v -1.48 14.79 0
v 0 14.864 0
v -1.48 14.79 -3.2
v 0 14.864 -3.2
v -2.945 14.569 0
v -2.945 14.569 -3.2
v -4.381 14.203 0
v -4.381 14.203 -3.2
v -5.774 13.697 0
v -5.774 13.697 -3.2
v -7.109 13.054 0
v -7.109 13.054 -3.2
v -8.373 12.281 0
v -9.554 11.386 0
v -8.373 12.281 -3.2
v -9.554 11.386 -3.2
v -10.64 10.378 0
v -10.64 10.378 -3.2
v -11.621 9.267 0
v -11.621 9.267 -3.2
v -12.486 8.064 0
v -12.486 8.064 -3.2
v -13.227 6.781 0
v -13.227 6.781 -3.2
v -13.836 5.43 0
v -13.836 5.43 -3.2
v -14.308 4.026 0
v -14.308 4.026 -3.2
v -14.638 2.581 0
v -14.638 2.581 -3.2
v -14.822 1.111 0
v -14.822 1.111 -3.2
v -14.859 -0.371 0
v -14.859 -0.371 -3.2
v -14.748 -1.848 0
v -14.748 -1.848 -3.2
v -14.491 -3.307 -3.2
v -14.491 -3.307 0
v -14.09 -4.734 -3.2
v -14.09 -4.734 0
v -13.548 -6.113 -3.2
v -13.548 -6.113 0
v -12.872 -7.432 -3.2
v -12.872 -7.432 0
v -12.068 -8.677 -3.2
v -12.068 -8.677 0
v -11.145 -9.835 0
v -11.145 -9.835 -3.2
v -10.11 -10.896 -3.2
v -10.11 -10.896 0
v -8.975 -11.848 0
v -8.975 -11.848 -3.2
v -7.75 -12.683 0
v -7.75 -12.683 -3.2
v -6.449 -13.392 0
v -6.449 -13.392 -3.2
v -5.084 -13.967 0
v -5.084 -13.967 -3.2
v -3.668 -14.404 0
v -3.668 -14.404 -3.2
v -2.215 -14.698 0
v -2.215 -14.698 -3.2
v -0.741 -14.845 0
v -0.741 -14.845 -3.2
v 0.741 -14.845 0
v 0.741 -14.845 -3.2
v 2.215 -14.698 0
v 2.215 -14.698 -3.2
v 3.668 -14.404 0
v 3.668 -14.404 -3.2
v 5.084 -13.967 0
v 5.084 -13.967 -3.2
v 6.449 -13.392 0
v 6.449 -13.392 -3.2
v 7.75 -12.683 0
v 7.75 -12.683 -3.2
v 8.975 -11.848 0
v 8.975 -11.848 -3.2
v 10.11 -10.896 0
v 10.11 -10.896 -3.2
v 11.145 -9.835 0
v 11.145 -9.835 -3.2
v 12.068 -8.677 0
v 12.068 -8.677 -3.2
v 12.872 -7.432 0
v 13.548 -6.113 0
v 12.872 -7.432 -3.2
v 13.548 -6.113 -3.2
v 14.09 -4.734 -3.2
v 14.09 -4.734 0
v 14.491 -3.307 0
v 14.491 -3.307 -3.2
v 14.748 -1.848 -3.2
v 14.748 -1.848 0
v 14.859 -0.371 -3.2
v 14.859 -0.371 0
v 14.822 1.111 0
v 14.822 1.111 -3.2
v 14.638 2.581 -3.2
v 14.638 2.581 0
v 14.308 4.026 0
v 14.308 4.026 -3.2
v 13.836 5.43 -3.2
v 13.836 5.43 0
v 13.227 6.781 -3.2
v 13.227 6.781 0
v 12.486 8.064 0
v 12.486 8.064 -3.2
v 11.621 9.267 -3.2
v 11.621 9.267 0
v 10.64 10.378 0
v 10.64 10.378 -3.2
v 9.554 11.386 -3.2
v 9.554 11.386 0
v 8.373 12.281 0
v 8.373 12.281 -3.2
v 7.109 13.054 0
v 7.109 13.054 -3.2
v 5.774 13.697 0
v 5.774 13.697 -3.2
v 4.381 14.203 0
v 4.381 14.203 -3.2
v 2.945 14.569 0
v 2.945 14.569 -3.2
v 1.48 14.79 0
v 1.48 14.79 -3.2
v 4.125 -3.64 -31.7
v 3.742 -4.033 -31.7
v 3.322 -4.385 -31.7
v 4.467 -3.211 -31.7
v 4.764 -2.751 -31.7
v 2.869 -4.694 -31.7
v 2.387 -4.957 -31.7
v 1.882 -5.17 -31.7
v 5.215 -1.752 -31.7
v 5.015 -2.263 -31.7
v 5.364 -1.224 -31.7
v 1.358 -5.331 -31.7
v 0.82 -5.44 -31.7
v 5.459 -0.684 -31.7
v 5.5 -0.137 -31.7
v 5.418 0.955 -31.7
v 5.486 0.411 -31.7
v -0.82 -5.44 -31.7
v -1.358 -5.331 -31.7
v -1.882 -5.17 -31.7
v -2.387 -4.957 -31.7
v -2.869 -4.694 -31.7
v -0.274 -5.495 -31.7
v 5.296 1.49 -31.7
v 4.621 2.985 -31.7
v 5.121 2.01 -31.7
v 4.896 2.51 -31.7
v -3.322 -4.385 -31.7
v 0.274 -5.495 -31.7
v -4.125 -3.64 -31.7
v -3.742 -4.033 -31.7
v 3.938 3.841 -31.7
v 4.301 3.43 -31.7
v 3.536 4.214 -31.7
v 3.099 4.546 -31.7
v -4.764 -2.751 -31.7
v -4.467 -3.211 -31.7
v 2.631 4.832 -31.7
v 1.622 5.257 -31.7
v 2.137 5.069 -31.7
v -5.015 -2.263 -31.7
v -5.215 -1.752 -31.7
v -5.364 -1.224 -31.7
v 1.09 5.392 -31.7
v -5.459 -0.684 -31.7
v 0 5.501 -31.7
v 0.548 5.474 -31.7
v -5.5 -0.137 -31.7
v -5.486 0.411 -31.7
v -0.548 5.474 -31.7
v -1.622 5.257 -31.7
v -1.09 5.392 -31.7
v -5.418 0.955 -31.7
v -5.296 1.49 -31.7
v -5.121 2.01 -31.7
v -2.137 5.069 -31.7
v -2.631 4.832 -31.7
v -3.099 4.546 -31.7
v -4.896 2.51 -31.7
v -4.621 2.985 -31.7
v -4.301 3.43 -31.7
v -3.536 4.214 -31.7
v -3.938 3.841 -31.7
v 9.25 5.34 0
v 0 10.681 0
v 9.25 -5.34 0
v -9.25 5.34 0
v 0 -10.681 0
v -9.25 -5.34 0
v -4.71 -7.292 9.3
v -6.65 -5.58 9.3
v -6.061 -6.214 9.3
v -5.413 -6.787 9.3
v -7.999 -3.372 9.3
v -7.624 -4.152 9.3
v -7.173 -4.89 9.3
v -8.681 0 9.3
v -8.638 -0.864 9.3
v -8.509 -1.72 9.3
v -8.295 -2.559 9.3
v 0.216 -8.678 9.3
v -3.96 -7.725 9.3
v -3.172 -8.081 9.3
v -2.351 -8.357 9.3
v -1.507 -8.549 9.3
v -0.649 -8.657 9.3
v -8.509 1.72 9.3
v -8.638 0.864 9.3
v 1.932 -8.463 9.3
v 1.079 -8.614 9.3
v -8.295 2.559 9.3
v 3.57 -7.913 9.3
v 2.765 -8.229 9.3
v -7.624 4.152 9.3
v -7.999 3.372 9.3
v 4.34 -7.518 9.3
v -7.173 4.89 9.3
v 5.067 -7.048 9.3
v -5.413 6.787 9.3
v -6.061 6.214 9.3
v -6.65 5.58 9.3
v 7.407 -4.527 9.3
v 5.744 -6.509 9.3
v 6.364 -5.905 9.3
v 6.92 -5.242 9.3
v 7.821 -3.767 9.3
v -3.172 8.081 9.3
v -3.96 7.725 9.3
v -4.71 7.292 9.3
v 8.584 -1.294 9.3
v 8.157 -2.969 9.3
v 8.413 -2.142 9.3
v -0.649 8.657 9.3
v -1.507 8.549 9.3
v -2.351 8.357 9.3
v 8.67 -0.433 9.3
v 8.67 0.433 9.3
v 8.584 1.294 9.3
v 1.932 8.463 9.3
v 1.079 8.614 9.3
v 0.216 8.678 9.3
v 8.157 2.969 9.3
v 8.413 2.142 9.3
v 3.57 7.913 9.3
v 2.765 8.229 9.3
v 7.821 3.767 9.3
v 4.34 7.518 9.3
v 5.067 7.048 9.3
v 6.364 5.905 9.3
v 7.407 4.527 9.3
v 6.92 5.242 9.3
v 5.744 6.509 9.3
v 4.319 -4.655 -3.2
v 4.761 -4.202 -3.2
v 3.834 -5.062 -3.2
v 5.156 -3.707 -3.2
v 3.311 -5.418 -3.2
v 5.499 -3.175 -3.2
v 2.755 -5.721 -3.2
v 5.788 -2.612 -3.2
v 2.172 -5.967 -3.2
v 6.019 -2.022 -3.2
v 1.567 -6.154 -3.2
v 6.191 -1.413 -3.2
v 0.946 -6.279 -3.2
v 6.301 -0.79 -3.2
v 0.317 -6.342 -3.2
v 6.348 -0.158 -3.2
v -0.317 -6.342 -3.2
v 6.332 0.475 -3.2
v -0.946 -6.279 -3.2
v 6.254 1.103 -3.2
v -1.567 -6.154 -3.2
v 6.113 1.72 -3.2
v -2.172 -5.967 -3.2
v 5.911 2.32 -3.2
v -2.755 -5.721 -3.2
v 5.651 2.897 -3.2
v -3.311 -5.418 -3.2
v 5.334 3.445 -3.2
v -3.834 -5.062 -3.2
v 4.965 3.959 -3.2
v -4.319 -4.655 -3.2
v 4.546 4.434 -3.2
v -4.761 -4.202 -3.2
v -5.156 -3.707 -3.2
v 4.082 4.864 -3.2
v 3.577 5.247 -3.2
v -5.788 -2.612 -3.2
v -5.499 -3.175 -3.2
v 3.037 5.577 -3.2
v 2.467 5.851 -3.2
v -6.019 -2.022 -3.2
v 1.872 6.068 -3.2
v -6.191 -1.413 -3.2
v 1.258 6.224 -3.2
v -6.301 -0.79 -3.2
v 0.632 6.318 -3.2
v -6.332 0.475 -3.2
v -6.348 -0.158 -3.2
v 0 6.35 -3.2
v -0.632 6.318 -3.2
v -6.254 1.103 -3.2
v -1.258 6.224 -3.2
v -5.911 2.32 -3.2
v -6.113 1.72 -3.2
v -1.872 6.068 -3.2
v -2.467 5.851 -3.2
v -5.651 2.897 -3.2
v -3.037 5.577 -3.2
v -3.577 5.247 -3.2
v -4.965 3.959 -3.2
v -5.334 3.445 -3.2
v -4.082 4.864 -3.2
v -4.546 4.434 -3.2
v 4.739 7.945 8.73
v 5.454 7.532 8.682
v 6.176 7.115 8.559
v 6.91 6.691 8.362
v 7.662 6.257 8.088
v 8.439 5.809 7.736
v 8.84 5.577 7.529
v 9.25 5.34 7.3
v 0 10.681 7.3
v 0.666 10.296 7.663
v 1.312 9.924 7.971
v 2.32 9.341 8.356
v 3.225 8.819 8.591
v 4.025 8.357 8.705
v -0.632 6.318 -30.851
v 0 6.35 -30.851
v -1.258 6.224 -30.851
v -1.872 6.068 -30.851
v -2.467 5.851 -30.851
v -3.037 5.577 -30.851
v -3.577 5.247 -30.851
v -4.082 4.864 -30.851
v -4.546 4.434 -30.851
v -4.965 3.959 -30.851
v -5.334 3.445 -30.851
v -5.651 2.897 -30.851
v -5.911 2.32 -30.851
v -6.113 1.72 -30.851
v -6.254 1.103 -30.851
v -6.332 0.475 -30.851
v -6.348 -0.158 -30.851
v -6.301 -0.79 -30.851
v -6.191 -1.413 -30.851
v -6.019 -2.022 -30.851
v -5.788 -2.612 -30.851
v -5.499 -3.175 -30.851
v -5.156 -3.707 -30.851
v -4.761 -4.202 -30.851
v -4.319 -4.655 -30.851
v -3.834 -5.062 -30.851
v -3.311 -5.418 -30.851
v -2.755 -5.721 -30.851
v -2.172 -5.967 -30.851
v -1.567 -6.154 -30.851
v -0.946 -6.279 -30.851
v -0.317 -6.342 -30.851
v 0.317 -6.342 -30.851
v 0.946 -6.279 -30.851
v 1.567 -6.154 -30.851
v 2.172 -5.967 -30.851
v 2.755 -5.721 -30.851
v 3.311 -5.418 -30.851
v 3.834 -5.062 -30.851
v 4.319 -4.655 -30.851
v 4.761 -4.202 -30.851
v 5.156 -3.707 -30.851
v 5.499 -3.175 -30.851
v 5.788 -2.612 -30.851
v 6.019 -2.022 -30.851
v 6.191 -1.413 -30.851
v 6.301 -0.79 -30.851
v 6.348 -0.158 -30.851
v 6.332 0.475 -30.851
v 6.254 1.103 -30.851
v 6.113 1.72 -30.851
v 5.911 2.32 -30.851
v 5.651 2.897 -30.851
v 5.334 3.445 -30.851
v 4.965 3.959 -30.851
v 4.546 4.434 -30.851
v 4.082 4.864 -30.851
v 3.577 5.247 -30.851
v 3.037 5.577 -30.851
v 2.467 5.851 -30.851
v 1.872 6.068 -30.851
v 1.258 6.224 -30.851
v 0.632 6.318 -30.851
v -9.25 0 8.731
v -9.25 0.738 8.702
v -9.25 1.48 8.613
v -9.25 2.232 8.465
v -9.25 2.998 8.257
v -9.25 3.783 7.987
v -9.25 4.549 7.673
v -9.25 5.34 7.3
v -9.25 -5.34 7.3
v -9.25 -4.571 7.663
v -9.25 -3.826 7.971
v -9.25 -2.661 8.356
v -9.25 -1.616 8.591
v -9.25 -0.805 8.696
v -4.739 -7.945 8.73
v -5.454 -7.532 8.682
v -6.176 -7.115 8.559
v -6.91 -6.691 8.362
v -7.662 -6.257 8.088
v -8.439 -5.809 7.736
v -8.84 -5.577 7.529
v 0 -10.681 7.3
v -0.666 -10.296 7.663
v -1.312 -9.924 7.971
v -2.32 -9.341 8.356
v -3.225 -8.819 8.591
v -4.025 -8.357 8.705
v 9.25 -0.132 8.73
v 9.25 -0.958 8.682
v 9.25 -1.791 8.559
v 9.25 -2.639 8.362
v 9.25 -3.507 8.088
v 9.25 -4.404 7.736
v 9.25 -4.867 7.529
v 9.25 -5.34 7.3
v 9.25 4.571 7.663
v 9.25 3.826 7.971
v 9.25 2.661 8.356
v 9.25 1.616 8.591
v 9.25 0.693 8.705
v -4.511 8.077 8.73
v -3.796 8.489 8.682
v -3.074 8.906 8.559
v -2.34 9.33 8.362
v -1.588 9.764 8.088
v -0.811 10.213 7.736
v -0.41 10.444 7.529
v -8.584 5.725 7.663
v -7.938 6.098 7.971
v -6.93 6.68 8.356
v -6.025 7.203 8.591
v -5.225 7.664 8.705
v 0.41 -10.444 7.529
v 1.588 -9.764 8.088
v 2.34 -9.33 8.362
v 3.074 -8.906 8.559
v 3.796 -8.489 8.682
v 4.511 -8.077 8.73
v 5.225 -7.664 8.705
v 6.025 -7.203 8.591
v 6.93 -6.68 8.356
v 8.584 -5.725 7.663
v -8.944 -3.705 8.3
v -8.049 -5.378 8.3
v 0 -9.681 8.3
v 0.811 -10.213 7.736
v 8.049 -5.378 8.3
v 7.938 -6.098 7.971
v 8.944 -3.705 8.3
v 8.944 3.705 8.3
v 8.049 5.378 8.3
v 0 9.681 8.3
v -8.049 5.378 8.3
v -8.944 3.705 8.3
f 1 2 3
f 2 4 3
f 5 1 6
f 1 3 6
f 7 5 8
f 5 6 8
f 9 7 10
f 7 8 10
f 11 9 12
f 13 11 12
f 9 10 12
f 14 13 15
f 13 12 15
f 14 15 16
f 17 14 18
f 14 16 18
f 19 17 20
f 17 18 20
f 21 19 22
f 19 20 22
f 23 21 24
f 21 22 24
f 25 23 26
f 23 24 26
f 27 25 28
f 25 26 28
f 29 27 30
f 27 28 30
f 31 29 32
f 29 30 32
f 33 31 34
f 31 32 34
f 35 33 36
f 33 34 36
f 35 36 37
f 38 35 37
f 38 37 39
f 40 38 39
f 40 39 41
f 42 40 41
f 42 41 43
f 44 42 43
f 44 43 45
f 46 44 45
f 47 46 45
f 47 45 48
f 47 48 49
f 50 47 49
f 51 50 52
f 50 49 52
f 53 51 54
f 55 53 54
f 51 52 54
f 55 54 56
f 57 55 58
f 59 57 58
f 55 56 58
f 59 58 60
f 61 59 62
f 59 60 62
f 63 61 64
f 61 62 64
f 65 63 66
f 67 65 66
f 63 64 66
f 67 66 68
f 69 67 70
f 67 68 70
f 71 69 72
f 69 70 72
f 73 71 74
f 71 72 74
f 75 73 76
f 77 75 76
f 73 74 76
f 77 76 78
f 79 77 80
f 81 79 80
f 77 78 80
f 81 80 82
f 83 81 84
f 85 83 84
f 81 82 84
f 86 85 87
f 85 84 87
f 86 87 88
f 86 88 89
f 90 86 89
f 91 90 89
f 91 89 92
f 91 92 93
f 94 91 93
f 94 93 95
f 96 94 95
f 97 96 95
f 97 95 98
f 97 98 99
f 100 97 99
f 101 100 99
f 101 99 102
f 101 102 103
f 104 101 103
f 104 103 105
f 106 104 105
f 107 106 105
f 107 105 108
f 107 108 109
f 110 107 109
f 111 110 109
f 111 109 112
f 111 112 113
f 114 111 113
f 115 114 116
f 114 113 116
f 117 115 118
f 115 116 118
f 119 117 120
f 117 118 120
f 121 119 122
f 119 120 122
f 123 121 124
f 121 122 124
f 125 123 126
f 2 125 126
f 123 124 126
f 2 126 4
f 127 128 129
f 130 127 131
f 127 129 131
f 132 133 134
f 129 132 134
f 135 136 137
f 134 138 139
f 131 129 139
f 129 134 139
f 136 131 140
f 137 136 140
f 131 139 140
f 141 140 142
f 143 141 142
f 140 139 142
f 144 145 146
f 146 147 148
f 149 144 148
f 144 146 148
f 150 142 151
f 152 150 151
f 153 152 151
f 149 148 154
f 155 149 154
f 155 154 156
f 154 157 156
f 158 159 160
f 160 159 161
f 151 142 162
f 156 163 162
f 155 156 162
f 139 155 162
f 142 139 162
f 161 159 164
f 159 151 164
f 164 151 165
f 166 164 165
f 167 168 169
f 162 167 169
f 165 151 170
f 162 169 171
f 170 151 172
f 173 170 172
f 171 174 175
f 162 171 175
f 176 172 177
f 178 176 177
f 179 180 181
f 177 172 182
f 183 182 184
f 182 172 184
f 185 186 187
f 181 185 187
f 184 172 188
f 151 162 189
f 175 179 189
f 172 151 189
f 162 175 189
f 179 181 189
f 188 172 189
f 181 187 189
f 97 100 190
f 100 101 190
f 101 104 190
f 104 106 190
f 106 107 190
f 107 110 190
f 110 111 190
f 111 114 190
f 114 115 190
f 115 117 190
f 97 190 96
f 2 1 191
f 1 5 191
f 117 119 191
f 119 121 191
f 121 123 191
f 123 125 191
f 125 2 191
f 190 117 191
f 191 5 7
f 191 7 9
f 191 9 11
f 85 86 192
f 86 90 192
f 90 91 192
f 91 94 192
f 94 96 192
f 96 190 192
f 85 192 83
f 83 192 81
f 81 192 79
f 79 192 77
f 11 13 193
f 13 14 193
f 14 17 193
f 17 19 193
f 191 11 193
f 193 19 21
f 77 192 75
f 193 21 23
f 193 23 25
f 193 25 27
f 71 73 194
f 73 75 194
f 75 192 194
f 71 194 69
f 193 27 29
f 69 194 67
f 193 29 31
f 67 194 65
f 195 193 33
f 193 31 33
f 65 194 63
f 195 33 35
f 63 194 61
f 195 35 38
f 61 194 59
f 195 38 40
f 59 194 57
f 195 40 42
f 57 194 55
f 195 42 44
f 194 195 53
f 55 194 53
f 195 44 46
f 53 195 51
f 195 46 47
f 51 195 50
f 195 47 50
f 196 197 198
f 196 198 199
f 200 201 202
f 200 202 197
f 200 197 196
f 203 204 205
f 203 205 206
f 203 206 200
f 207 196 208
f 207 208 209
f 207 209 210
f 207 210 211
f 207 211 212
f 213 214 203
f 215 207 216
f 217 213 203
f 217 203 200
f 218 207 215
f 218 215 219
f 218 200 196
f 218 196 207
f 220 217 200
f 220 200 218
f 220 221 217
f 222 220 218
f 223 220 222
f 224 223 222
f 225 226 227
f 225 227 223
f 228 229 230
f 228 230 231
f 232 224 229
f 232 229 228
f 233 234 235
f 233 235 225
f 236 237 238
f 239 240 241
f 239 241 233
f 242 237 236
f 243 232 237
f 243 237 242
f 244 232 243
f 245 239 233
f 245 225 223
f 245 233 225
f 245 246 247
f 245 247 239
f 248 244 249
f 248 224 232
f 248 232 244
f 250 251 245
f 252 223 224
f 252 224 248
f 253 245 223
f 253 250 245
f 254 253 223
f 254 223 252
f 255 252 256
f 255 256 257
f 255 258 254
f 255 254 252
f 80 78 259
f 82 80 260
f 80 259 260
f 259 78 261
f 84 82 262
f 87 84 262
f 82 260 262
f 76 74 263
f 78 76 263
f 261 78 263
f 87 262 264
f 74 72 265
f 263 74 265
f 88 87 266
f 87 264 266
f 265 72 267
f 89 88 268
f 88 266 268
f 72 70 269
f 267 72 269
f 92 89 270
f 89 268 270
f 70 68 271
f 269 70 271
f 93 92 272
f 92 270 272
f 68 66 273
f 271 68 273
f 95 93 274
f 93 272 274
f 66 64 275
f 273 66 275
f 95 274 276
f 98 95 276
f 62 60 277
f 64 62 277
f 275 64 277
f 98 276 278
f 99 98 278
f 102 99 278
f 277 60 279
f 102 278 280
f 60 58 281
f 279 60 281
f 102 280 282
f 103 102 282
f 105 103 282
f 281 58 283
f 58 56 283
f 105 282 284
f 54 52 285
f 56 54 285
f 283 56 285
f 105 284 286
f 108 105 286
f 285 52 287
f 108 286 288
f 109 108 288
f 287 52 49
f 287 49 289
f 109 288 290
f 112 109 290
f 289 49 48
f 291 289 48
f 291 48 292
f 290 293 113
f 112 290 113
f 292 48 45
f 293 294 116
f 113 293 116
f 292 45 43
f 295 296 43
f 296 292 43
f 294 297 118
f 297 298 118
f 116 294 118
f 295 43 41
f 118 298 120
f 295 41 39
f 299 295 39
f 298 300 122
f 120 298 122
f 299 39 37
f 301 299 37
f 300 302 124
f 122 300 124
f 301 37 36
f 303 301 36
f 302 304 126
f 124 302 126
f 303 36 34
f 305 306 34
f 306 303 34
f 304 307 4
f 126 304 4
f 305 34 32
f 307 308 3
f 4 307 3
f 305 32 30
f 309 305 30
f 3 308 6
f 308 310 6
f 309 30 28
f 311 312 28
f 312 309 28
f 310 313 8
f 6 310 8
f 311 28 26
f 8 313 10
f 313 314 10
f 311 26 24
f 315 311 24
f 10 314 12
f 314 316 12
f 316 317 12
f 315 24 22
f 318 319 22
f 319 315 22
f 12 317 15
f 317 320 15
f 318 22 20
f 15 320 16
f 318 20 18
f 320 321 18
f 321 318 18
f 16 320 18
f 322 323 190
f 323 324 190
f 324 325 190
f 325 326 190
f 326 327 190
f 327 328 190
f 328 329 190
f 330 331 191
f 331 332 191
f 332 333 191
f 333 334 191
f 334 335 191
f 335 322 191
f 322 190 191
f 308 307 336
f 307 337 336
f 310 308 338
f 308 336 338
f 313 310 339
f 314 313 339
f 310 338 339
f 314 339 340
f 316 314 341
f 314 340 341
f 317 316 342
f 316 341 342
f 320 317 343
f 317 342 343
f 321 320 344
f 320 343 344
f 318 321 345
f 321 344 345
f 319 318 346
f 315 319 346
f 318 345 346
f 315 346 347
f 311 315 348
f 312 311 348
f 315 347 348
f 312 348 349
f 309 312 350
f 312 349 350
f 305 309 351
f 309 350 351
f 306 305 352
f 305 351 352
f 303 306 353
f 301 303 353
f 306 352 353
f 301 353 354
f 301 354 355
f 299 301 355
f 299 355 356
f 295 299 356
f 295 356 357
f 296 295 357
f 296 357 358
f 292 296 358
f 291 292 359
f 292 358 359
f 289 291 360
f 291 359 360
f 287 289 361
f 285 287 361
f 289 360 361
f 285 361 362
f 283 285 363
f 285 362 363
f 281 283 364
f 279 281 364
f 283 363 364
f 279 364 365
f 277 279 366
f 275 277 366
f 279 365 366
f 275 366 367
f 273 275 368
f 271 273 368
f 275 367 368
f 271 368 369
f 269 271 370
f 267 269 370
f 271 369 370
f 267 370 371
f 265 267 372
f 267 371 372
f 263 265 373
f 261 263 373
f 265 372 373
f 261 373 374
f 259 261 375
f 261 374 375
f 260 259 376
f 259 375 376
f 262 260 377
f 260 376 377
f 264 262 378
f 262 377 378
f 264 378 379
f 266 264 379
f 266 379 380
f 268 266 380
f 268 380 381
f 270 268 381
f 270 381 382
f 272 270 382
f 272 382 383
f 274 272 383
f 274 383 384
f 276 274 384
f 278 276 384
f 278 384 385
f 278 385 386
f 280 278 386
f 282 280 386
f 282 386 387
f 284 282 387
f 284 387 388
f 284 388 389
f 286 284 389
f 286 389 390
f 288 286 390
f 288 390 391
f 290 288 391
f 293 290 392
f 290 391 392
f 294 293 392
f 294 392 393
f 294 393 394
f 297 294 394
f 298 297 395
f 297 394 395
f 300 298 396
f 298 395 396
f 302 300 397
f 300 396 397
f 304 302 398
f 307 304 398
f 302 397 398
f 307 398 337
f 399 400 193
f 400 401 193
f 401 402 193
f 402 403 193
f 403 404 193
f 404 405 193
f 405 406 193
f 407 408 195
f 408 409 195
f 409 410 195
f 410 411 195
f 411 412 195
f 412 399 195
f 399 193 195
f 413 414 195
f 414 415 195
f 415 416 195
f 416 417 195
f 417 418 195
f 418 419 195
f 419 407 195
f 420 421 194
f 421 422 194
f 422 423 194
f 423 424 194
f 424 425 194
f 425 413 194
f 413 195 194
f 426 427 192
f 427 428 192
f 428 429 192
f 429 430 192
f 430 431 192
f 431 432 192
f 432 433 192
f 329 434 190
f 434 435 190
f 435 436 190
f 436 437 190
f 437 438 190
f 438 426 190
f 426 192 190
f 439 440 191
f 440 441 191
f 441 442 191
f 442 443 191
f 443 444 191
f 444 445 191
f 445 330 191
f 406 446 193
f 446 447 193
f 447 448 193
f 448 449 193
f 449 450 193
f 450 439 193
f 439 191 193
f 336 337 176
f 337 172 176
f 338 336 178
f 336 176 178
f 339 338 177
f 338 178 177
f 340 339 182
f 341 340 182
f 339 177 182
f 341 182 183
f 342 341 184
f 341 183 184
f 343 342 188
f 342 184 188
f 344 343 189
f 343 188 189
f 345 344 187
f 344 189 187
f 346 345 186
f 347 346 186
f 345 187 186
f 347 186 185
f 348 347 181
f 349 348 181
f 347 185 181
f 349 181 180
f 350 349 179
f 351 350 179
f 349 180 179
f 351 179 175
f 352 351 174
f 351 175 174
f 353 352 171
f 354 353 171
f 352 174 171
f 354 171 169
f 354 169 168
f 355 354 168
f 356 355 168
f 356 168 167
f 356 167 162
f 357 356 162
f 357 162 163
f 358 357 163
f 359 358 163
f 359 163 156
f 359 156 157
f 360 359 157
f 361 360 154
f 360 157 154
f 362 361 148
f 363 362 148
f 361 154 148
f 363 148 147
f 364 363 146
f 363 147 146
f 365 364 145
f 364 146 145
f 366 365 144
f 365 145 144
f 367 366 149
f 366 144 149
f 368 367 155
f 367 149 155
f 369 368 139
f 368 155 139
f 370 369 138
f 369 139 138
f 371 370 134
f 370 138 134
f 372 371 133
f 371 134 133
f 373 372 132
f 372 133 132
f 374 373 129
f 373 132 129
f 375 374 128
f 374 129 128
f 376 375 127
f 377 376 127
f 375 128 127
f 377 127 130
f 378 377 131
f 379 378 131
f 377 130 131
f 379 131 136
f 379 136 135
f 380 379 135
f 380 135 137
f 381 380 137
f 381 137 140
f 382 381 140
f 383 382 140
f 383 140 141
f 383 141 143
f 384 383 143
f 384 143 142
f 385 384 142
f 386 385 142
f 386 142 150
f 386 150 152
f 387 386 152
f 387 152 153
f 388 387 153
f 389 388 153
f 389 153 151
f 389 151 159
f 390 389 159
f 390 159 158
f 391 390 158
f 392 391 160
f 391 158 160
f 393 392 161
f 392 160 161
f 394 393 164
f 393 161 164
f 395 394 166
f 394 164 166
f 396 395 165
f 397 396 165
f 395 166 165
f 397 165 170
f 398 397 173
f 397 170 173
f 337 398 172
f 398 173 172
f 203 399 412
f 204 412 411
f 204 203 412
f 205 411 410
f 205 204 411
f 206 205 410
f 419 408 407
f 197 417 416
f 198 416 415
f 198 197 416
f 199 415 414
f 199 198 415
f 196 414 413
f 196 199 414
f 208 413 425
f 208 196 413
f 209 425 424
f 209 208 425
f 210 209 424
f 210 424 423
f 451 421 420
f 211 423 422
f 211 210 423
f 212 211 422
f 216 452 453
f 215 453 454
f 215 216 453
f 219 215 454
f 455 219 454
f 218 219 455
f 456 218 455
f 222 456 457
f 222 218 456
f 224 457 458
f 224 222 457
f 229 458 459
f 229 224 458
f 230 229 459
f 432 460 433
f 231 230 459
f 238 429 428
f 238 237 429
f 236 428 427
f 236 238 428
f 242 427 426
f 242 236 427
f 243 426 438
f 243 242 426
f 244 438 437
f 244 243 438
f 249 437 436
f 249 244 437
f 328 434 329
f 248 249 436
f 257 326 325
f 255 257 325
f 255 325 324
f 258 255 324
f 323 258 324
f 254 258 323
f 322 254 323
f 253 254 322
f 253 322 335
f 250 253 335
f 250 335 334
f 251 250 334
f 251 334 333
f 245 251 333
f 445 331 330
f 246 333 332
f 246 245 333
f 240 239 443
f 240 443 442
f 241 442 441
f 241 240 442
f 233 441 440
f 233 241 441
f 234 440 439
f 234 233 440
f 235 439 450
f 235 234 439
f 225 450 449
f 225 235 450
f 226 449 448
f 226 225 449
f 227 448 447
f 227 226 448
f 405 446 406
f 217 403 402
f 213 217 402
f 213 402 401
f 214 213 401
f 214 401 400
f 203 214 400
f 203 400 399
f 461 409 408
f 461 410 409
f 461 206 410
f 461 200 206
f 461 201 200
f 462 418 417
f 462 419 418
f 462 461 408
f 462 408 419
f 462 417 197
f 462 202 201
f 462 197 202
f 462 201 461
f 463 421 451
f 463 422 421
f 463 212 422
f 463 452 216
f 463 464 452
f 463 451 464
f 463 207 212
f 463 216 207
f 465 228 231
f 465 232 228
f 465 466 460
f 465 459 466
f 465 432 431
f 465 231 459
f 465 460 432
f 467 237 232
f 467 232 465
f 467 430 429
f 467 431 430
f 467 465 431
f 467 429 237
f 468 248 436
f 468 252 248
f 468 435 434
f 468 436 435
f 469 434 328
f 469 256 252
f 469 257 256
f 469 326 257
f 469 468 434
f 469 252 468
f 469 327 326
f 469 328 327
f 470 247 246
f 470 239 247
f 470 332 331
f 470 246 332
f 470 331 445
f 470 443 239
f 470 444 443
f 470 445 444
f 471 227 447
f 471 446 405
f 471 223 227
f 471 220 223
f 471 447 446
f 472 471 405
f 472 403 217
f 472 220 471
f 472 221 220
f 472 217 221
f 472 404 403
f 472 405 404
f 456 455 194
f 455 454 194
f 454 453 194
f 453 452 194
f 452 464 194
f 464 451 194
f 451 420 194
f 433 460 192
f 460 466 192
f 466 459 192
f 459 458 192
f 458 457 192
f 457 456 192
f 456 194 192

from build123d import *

# Parameters (mm, degrees)
BOSS_EXTRUDE2_DEPTH = 9.3


with BuildPart() as part:
    # Sketch6 → Boss-Extrude2 (new body)
    with BuildSketch(Plane.XY):
        Polygon((0, 10.68097998), (-9.25, 5.34048999), (-9.25, -5.34048999), (0, -10.68097998), (9.25, -5.34048999), (9.25, 5.34048999), align=None)
    extrude(amount=BOSS_EXTRUDE2_DEPTH)

    # Sketch8 → Cut-Revolve1 (revolve, cut)
    with BuildSketch(Plane(origin=(0, 0, 0), x_dir=(0, 0, -1), z_dir=(1, 0, 0)), mode=Mode.PRIVATE) as cut_revolve1_sk:
        Polygon((-7.3, 10.68097998), (-9.3, 8.68097998), (-9.3, 10.68097998), align=None)
    revolve(cut_revolve1_sk.sketch.rotate(Axis((0, 0, 0), (0, 0, 1)), 90), axis=Axis((0, 0, 0), (0, 0, 1)), mode=Mode.SUBTRACT)

    # Sketch10 → Revolve1 (revolve)
    with BuildSketch(Plane(origin=(0, 0, 0), x_dir=(0, 0, -1), z_dir=(1, 0, 0))):
        Polygon((0, 0), (0, 14.863694745), (3.2, 14.863694745), (3.2, 6.35), (30.851471863, 6.35), (31.7, 5.501471863), (31.7, 0), align=None)
    revolve(axis=Axis((0, 0, -31.7), (0, 0, 1)))


solid = part.part
